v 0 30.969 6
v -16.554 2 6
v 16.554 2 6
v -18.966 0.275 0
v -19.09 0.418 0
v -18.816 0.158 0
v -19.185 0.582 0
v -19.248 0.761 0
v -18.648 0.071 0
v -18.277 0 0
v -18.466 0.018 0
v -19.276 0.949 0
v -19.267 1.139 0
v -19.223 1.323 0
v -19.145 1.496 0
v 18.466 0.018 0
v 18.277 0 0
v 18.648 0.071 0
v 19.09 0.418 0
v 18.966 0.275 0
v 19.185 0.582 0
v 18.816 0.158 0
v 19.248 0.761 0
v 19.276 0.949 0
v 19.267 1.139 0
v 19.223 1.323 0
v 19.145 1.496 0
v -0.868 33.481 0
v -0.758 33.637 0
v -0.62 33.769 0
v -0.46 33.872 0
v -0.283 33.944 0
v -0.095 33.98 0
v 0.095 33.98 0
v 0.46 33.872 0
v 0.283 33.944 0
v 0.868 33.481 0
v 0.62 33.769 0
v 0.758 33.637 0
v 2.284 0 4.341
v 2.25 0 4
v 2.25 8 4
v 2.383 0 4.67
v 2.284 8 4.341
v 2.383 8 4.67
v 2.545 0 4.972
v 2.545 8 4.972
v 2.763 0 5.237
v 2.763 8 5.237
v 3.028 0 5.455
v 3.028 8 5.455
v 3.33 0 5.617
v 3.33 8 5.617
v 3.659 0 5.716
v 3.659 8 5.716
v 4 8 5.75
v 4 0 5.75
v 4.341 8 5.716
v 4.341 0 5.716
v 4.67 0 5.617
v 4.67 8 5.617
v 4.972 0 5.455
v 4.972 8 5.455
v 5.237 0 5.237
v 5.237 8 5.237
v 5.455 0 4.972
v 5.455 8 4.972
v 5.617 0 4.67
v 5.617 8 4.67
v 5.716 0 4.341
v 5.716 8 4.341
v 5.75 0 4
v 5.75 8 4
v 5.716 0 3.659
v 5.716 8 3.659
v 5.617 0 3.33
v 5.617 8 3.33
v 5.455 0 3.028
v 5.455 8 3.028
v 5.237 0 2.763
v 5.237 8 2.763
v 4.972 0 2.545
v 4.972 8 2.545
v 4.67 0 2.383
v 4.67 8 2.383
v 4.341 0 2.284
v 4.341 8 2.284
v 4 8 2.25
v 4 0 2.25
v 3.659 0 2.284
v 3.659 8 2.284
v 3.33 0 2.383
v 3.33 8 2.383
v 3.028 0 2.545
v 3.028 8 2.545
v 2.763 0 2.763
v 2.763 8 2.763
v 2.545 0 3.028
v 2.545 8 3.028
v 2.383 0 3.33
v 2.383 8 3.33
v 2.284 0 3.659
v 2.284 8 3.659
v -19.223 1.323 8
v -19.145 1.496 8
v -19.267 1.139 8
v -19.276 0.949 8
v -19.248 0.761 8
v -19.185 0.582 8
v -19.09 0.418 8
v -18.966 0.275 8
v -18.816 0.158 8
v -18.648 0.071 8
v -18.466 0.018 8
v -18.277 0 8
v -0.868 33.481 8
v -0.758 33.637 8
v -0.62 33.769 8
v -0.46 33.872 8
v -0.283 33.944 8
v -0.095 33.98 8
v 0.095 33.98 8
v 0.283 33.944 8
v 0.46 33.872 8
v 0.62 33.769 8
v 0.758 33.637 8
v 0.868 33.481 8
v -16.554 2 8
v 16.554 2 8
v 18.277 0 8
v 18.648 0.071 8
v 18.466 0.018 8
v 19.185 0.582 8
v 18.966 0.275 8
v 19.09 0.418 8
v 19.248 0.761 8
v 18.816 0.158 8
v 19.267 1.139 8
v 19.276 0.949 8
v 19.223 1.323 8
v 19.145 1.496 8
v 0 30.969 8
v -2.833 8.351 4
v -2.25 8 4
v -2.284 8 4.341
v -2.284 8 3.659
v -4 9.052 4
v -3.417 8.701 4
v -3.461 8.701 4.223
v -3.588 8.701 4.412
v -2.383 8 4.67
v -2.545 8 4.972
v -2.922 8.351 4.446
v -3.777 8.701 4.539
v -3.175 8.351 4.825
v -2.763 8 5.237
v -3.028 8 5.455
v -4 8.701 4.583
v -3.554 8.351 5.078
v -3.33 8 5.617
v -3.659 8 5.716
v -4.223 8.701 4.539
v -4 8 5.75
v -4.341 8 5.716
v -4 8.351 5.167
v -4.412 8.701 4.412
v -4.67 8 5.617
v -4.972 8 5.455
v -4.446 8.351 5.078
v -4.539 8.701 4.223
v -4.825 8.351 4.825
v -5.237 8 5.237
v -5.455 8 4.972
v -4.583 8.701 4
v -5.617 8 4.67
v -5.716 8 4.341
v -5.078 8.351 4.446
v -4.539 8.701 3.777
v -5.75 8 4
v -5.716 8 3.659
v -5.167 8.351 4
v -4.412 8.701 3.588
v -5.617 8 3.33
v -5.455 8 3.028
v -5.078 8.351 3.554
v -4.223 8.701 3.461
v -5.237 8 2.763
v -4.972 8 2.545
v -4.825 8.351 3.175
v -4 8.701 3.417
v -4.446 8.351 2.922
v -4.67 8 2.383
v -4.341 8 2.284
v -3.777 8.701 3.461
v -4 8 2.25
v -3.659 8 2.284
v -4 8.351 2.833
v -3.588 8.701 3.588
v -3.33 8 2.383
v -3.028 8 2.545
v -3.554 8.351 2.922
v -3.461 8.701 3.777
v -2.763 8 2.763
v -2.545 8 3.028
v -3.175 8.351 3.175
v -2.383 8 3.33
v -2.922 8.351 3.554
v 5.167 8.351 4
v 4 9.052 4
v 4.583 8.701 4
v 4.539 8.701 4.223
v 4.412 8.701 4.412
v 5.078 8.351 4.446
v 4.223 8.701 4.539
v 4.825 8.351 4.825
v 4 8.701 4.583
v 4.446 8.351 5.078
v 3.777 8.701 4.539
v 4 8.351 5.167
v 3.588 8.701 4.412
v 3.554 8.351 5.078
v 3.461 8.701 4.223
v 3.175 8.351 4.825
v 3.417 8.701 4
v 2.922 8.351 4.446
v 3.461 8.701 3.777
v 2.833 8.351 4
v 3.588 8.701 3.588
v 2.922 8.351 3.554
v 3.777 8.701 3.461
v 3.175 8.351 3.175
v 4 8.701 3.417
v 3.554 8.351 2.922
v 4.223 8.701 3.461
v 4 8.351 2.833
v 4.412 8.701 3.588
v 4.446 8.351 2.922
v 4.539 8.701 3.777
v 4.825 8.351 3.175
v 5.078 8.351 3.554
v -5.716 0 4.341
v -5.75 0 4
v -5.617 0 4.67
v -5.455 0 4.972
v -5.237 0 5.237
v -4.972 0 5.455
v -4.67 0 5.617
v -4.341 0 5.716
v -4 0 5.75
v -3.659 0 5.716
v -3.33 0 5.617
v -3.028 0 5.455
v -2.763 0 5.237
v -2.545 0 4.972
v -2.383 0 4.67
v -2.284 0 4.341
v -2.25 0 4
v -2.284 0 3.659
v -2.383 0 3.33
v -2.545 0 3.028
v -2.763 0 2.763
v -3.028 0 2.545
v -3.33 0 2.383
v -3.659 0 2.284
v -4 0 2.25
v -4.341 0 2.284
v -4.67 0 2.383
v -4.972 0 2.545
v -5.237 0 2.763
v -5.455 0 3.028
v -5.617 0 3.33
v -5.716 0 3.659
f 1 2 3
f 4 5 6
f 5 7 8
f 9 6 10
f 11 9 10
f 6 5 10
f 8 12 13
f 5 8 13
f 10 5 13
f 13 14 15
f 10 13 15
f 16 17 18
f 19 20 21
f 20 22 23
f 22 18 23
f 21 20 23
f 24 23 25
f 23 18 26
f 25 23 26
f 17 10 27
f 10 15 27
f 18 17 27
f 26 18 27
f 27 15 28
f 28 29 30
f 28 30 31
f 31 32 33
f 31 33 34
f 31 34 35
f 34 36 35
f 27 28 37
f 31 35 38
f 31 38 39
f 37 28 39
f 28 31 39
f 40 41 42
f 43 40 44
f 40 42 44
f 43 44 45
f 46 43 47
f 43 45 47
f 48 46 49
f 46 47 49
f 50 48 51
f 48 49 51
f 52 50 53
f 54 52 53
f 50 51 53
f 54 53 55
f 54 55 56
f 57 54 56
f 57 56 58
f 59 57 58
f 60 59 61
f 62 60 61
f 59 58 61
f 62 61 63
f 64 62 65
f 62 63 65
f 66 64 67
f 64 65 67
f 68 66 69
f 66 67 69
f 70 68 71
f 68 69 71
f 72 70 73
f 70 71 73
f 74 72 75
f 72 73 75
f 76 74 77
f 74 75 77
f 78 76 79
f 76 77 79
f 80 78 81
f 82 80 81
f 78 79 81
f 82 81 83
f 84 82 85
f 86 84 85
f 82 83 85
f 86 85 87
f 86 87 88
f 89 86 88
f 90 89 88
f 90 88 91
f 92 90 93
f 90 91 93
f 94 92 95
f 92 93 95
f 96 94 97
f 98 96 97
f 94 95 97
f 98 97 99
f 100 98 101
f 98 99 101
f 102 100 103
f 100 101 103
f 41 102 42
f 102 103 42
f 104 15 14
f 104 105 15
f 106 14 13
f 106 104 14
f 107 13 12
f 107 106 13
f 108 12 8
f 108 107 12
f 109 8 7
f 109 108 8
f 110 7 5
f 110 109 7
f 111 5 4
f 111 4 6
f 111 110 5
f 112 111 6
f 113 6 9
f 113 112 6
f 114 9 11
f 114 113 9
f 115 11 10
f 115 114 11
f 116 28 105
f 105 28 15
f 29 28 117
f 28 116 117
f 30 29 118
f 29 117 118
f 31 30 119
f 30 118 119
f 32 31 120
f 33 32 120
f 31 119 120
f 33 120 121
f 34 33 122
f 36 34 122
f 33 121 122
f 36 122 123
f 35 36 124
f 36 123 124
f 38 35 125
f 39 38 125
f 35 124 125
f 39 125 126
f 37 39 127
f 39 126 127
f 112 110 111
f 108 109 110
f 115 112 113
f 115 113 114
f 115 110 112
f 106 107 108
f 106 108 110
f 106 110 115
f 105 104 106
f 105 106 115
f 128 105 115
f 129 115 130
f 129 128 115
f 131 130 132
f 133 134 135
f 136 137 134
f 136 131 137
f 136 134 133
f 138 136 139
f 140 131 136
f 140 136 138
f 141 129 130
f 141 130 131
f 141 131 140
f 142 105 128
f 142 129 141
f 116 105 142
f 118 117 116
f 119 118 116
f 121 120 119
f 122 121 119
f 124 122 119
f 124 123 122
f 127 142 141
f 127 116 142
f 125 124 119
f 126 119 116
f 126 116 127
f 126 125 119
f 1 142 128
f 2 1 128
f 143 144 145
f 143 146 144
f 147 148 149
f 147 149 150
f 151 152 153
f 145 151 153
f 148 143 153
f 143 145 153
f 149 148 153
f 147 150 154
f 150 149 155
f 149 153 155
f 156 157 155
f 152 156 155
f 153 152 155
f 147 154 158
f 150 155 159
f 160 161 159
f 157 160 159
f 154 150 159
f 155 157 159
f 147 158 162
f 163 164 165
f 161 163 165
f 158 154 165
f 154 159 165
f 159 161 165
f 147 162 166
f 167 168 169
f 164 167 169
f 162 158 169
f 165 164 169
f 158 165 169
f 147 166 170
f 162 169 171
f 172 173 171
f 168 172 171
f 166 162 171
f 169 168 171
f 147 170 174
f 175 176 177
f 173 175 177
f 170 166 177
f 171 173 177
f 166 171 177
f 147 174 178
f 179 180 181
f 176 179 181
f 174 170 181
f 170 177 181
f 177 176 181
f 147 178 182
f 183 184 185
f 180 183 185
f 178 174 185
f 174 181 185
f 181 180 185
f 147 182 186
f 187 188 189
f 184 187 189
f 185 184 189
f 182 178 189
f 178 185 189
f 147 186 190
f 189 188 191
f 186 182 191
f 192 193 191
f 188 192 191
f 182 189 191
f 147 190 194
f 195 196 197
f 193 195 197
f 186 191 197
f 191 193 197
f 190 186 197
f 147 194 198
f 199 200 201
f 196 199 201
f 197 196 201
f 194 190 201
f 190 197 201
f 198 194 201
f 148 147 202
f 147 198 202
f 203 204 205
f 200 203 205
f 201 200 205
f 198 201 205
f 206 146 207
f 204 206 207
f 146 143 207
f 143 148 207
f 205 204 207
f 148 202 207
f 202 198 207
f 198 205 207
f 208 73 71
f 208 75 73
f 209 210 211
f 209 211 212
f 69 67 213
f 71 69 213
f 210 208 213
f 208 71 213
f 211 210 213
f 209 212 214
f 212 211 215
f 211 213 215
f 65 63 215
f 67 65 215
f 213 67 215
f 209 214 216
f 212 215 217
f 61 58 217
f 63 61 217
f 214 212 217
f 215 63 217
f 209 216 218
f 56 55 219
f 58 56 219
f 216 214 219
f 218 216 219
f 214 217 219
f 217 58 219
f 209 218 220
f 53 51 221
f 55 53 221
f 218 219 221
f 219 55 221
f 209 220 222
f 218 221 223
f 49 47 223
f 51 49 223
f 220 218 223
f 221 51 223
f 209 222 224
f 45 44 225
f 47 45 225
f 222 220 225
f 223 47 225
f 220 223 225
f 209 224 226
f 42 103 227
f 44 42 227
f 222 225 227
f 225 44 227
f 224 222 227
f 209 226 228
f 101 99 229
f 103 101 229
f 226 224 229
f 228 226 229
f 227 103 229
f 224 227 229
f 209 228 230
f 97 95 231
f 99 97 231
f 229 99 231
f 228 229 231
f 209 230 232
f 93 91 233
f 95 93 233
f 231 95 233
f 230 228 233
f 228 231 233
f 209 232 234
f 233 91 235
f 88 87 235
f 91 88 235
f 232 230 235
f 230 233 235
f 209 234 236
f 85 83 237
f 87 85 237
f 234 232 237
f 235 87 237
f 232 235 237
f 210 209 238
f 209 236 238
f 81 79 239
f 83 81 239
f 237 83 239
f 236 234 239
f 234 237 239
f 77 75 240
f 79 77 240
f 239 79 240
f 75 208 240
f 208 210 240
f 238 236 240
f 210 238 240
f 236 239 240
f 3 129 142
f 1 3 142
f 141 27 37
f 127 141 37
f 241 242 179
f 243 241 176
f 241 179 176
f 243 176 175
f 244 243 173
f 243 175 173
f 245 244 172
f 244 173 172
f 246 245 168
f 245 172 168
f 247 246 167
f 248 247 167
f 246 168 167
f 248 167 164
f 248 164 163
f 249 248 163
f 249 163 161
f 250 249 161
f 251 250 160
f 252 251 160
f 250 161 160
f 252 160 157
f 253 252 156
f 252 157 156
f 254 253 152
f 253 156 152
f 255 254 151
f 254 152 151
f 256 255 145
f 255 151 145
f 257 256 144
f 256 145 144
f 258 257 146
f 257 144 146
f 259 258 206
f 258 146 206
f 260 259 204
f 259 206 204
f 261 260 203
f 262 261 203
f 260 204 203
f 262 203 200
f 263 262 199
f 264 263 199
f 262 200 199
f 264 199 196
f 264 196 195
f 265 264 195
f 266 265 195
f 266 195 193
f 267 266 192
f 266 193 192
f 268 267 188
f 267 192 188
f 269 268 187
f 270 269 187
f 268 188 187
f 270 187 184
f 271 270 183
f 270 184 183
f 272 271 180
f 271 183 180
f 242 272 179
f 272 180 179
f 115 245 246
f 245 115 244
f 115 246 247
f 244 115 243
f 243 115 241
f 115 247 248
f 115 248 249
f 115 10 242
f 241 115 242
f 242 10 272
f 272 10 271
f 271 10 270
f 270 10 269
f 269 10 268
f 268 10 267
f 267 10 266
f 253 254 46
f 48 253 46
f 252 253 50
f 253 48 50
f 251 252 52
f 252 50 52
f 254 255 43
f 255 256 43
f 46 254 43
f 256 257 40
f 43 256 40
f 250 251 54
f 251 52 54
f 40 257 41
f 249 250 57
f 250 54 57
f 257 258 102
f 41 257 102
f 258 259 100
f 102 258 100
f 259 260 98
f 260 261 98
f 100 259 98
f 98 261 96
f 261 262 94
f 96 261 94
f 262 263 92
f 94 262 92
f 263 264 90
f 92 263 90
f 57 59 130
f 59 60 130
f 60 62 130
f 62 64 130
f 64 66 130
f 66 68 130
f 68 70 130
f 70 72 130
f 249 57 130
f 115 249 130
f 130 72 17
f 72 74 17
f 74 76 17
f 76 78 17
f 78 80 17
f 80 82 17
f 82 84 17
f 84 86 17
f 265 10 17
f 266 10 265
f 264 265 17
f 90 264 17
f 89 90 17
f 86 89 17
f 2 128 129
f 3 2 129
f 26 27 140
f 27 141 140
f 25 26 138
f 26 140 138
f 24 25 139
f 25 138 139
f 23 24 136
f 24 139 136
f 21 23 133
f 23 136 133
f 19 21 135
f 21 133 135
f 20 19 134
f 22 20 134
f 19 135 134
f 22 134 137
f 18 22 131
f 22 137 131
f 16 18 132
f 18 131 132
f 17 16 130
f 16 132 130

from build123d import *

# Parameters (mm, degrees)
F1_DEPTH = 8
F3_DEPTH = 2
F5_D     = 3.5
F5_DEPTH = 8
F5_TIP   = 1.0515060833
F6_R     = 1


with BuildPart() as f1:
    # F0 (on Top) → F1 (new body)
    with BuildSketch(Plane.XY):
        Polygon((0, 35), (-20, 0), (20, 0), align=None)
    extrude(amount=F1_DEPTH)

    # F2 (on face) → F3 (cut)
    with BuildSketch(Plane.XY.offset(8)):
        Polygon((0, 30.9688711259), (-16.5536406433, 2), (16.5536406433, 2), align=None)
    extrude(amount=-F3_DEPTH, mode=Mode.SUBTRACT)

    # F5
    with Locations(Plane.XZ):
        with Locations((-4, 4), (4, 4)):
            Hole(F5_D / 2, depth=F5_DEPTH)
            with Locations((0, 0, -(F5_DEPTH + F5_TIP / 2))):  # 118° drill point
                Cone(0, F5_D / 2, F5_TIP, mode=Mode.SUBTRACT)

    # F6
    f6_edges = [f1.edges().sort_by_distance(p)[0] for p in [
        (0, 35, 4),
        (-20, 0, 4),
        (20, 0, 4),
    ]]
    fillet(f6_edges, radius=F6_R)


solid = f1.part
